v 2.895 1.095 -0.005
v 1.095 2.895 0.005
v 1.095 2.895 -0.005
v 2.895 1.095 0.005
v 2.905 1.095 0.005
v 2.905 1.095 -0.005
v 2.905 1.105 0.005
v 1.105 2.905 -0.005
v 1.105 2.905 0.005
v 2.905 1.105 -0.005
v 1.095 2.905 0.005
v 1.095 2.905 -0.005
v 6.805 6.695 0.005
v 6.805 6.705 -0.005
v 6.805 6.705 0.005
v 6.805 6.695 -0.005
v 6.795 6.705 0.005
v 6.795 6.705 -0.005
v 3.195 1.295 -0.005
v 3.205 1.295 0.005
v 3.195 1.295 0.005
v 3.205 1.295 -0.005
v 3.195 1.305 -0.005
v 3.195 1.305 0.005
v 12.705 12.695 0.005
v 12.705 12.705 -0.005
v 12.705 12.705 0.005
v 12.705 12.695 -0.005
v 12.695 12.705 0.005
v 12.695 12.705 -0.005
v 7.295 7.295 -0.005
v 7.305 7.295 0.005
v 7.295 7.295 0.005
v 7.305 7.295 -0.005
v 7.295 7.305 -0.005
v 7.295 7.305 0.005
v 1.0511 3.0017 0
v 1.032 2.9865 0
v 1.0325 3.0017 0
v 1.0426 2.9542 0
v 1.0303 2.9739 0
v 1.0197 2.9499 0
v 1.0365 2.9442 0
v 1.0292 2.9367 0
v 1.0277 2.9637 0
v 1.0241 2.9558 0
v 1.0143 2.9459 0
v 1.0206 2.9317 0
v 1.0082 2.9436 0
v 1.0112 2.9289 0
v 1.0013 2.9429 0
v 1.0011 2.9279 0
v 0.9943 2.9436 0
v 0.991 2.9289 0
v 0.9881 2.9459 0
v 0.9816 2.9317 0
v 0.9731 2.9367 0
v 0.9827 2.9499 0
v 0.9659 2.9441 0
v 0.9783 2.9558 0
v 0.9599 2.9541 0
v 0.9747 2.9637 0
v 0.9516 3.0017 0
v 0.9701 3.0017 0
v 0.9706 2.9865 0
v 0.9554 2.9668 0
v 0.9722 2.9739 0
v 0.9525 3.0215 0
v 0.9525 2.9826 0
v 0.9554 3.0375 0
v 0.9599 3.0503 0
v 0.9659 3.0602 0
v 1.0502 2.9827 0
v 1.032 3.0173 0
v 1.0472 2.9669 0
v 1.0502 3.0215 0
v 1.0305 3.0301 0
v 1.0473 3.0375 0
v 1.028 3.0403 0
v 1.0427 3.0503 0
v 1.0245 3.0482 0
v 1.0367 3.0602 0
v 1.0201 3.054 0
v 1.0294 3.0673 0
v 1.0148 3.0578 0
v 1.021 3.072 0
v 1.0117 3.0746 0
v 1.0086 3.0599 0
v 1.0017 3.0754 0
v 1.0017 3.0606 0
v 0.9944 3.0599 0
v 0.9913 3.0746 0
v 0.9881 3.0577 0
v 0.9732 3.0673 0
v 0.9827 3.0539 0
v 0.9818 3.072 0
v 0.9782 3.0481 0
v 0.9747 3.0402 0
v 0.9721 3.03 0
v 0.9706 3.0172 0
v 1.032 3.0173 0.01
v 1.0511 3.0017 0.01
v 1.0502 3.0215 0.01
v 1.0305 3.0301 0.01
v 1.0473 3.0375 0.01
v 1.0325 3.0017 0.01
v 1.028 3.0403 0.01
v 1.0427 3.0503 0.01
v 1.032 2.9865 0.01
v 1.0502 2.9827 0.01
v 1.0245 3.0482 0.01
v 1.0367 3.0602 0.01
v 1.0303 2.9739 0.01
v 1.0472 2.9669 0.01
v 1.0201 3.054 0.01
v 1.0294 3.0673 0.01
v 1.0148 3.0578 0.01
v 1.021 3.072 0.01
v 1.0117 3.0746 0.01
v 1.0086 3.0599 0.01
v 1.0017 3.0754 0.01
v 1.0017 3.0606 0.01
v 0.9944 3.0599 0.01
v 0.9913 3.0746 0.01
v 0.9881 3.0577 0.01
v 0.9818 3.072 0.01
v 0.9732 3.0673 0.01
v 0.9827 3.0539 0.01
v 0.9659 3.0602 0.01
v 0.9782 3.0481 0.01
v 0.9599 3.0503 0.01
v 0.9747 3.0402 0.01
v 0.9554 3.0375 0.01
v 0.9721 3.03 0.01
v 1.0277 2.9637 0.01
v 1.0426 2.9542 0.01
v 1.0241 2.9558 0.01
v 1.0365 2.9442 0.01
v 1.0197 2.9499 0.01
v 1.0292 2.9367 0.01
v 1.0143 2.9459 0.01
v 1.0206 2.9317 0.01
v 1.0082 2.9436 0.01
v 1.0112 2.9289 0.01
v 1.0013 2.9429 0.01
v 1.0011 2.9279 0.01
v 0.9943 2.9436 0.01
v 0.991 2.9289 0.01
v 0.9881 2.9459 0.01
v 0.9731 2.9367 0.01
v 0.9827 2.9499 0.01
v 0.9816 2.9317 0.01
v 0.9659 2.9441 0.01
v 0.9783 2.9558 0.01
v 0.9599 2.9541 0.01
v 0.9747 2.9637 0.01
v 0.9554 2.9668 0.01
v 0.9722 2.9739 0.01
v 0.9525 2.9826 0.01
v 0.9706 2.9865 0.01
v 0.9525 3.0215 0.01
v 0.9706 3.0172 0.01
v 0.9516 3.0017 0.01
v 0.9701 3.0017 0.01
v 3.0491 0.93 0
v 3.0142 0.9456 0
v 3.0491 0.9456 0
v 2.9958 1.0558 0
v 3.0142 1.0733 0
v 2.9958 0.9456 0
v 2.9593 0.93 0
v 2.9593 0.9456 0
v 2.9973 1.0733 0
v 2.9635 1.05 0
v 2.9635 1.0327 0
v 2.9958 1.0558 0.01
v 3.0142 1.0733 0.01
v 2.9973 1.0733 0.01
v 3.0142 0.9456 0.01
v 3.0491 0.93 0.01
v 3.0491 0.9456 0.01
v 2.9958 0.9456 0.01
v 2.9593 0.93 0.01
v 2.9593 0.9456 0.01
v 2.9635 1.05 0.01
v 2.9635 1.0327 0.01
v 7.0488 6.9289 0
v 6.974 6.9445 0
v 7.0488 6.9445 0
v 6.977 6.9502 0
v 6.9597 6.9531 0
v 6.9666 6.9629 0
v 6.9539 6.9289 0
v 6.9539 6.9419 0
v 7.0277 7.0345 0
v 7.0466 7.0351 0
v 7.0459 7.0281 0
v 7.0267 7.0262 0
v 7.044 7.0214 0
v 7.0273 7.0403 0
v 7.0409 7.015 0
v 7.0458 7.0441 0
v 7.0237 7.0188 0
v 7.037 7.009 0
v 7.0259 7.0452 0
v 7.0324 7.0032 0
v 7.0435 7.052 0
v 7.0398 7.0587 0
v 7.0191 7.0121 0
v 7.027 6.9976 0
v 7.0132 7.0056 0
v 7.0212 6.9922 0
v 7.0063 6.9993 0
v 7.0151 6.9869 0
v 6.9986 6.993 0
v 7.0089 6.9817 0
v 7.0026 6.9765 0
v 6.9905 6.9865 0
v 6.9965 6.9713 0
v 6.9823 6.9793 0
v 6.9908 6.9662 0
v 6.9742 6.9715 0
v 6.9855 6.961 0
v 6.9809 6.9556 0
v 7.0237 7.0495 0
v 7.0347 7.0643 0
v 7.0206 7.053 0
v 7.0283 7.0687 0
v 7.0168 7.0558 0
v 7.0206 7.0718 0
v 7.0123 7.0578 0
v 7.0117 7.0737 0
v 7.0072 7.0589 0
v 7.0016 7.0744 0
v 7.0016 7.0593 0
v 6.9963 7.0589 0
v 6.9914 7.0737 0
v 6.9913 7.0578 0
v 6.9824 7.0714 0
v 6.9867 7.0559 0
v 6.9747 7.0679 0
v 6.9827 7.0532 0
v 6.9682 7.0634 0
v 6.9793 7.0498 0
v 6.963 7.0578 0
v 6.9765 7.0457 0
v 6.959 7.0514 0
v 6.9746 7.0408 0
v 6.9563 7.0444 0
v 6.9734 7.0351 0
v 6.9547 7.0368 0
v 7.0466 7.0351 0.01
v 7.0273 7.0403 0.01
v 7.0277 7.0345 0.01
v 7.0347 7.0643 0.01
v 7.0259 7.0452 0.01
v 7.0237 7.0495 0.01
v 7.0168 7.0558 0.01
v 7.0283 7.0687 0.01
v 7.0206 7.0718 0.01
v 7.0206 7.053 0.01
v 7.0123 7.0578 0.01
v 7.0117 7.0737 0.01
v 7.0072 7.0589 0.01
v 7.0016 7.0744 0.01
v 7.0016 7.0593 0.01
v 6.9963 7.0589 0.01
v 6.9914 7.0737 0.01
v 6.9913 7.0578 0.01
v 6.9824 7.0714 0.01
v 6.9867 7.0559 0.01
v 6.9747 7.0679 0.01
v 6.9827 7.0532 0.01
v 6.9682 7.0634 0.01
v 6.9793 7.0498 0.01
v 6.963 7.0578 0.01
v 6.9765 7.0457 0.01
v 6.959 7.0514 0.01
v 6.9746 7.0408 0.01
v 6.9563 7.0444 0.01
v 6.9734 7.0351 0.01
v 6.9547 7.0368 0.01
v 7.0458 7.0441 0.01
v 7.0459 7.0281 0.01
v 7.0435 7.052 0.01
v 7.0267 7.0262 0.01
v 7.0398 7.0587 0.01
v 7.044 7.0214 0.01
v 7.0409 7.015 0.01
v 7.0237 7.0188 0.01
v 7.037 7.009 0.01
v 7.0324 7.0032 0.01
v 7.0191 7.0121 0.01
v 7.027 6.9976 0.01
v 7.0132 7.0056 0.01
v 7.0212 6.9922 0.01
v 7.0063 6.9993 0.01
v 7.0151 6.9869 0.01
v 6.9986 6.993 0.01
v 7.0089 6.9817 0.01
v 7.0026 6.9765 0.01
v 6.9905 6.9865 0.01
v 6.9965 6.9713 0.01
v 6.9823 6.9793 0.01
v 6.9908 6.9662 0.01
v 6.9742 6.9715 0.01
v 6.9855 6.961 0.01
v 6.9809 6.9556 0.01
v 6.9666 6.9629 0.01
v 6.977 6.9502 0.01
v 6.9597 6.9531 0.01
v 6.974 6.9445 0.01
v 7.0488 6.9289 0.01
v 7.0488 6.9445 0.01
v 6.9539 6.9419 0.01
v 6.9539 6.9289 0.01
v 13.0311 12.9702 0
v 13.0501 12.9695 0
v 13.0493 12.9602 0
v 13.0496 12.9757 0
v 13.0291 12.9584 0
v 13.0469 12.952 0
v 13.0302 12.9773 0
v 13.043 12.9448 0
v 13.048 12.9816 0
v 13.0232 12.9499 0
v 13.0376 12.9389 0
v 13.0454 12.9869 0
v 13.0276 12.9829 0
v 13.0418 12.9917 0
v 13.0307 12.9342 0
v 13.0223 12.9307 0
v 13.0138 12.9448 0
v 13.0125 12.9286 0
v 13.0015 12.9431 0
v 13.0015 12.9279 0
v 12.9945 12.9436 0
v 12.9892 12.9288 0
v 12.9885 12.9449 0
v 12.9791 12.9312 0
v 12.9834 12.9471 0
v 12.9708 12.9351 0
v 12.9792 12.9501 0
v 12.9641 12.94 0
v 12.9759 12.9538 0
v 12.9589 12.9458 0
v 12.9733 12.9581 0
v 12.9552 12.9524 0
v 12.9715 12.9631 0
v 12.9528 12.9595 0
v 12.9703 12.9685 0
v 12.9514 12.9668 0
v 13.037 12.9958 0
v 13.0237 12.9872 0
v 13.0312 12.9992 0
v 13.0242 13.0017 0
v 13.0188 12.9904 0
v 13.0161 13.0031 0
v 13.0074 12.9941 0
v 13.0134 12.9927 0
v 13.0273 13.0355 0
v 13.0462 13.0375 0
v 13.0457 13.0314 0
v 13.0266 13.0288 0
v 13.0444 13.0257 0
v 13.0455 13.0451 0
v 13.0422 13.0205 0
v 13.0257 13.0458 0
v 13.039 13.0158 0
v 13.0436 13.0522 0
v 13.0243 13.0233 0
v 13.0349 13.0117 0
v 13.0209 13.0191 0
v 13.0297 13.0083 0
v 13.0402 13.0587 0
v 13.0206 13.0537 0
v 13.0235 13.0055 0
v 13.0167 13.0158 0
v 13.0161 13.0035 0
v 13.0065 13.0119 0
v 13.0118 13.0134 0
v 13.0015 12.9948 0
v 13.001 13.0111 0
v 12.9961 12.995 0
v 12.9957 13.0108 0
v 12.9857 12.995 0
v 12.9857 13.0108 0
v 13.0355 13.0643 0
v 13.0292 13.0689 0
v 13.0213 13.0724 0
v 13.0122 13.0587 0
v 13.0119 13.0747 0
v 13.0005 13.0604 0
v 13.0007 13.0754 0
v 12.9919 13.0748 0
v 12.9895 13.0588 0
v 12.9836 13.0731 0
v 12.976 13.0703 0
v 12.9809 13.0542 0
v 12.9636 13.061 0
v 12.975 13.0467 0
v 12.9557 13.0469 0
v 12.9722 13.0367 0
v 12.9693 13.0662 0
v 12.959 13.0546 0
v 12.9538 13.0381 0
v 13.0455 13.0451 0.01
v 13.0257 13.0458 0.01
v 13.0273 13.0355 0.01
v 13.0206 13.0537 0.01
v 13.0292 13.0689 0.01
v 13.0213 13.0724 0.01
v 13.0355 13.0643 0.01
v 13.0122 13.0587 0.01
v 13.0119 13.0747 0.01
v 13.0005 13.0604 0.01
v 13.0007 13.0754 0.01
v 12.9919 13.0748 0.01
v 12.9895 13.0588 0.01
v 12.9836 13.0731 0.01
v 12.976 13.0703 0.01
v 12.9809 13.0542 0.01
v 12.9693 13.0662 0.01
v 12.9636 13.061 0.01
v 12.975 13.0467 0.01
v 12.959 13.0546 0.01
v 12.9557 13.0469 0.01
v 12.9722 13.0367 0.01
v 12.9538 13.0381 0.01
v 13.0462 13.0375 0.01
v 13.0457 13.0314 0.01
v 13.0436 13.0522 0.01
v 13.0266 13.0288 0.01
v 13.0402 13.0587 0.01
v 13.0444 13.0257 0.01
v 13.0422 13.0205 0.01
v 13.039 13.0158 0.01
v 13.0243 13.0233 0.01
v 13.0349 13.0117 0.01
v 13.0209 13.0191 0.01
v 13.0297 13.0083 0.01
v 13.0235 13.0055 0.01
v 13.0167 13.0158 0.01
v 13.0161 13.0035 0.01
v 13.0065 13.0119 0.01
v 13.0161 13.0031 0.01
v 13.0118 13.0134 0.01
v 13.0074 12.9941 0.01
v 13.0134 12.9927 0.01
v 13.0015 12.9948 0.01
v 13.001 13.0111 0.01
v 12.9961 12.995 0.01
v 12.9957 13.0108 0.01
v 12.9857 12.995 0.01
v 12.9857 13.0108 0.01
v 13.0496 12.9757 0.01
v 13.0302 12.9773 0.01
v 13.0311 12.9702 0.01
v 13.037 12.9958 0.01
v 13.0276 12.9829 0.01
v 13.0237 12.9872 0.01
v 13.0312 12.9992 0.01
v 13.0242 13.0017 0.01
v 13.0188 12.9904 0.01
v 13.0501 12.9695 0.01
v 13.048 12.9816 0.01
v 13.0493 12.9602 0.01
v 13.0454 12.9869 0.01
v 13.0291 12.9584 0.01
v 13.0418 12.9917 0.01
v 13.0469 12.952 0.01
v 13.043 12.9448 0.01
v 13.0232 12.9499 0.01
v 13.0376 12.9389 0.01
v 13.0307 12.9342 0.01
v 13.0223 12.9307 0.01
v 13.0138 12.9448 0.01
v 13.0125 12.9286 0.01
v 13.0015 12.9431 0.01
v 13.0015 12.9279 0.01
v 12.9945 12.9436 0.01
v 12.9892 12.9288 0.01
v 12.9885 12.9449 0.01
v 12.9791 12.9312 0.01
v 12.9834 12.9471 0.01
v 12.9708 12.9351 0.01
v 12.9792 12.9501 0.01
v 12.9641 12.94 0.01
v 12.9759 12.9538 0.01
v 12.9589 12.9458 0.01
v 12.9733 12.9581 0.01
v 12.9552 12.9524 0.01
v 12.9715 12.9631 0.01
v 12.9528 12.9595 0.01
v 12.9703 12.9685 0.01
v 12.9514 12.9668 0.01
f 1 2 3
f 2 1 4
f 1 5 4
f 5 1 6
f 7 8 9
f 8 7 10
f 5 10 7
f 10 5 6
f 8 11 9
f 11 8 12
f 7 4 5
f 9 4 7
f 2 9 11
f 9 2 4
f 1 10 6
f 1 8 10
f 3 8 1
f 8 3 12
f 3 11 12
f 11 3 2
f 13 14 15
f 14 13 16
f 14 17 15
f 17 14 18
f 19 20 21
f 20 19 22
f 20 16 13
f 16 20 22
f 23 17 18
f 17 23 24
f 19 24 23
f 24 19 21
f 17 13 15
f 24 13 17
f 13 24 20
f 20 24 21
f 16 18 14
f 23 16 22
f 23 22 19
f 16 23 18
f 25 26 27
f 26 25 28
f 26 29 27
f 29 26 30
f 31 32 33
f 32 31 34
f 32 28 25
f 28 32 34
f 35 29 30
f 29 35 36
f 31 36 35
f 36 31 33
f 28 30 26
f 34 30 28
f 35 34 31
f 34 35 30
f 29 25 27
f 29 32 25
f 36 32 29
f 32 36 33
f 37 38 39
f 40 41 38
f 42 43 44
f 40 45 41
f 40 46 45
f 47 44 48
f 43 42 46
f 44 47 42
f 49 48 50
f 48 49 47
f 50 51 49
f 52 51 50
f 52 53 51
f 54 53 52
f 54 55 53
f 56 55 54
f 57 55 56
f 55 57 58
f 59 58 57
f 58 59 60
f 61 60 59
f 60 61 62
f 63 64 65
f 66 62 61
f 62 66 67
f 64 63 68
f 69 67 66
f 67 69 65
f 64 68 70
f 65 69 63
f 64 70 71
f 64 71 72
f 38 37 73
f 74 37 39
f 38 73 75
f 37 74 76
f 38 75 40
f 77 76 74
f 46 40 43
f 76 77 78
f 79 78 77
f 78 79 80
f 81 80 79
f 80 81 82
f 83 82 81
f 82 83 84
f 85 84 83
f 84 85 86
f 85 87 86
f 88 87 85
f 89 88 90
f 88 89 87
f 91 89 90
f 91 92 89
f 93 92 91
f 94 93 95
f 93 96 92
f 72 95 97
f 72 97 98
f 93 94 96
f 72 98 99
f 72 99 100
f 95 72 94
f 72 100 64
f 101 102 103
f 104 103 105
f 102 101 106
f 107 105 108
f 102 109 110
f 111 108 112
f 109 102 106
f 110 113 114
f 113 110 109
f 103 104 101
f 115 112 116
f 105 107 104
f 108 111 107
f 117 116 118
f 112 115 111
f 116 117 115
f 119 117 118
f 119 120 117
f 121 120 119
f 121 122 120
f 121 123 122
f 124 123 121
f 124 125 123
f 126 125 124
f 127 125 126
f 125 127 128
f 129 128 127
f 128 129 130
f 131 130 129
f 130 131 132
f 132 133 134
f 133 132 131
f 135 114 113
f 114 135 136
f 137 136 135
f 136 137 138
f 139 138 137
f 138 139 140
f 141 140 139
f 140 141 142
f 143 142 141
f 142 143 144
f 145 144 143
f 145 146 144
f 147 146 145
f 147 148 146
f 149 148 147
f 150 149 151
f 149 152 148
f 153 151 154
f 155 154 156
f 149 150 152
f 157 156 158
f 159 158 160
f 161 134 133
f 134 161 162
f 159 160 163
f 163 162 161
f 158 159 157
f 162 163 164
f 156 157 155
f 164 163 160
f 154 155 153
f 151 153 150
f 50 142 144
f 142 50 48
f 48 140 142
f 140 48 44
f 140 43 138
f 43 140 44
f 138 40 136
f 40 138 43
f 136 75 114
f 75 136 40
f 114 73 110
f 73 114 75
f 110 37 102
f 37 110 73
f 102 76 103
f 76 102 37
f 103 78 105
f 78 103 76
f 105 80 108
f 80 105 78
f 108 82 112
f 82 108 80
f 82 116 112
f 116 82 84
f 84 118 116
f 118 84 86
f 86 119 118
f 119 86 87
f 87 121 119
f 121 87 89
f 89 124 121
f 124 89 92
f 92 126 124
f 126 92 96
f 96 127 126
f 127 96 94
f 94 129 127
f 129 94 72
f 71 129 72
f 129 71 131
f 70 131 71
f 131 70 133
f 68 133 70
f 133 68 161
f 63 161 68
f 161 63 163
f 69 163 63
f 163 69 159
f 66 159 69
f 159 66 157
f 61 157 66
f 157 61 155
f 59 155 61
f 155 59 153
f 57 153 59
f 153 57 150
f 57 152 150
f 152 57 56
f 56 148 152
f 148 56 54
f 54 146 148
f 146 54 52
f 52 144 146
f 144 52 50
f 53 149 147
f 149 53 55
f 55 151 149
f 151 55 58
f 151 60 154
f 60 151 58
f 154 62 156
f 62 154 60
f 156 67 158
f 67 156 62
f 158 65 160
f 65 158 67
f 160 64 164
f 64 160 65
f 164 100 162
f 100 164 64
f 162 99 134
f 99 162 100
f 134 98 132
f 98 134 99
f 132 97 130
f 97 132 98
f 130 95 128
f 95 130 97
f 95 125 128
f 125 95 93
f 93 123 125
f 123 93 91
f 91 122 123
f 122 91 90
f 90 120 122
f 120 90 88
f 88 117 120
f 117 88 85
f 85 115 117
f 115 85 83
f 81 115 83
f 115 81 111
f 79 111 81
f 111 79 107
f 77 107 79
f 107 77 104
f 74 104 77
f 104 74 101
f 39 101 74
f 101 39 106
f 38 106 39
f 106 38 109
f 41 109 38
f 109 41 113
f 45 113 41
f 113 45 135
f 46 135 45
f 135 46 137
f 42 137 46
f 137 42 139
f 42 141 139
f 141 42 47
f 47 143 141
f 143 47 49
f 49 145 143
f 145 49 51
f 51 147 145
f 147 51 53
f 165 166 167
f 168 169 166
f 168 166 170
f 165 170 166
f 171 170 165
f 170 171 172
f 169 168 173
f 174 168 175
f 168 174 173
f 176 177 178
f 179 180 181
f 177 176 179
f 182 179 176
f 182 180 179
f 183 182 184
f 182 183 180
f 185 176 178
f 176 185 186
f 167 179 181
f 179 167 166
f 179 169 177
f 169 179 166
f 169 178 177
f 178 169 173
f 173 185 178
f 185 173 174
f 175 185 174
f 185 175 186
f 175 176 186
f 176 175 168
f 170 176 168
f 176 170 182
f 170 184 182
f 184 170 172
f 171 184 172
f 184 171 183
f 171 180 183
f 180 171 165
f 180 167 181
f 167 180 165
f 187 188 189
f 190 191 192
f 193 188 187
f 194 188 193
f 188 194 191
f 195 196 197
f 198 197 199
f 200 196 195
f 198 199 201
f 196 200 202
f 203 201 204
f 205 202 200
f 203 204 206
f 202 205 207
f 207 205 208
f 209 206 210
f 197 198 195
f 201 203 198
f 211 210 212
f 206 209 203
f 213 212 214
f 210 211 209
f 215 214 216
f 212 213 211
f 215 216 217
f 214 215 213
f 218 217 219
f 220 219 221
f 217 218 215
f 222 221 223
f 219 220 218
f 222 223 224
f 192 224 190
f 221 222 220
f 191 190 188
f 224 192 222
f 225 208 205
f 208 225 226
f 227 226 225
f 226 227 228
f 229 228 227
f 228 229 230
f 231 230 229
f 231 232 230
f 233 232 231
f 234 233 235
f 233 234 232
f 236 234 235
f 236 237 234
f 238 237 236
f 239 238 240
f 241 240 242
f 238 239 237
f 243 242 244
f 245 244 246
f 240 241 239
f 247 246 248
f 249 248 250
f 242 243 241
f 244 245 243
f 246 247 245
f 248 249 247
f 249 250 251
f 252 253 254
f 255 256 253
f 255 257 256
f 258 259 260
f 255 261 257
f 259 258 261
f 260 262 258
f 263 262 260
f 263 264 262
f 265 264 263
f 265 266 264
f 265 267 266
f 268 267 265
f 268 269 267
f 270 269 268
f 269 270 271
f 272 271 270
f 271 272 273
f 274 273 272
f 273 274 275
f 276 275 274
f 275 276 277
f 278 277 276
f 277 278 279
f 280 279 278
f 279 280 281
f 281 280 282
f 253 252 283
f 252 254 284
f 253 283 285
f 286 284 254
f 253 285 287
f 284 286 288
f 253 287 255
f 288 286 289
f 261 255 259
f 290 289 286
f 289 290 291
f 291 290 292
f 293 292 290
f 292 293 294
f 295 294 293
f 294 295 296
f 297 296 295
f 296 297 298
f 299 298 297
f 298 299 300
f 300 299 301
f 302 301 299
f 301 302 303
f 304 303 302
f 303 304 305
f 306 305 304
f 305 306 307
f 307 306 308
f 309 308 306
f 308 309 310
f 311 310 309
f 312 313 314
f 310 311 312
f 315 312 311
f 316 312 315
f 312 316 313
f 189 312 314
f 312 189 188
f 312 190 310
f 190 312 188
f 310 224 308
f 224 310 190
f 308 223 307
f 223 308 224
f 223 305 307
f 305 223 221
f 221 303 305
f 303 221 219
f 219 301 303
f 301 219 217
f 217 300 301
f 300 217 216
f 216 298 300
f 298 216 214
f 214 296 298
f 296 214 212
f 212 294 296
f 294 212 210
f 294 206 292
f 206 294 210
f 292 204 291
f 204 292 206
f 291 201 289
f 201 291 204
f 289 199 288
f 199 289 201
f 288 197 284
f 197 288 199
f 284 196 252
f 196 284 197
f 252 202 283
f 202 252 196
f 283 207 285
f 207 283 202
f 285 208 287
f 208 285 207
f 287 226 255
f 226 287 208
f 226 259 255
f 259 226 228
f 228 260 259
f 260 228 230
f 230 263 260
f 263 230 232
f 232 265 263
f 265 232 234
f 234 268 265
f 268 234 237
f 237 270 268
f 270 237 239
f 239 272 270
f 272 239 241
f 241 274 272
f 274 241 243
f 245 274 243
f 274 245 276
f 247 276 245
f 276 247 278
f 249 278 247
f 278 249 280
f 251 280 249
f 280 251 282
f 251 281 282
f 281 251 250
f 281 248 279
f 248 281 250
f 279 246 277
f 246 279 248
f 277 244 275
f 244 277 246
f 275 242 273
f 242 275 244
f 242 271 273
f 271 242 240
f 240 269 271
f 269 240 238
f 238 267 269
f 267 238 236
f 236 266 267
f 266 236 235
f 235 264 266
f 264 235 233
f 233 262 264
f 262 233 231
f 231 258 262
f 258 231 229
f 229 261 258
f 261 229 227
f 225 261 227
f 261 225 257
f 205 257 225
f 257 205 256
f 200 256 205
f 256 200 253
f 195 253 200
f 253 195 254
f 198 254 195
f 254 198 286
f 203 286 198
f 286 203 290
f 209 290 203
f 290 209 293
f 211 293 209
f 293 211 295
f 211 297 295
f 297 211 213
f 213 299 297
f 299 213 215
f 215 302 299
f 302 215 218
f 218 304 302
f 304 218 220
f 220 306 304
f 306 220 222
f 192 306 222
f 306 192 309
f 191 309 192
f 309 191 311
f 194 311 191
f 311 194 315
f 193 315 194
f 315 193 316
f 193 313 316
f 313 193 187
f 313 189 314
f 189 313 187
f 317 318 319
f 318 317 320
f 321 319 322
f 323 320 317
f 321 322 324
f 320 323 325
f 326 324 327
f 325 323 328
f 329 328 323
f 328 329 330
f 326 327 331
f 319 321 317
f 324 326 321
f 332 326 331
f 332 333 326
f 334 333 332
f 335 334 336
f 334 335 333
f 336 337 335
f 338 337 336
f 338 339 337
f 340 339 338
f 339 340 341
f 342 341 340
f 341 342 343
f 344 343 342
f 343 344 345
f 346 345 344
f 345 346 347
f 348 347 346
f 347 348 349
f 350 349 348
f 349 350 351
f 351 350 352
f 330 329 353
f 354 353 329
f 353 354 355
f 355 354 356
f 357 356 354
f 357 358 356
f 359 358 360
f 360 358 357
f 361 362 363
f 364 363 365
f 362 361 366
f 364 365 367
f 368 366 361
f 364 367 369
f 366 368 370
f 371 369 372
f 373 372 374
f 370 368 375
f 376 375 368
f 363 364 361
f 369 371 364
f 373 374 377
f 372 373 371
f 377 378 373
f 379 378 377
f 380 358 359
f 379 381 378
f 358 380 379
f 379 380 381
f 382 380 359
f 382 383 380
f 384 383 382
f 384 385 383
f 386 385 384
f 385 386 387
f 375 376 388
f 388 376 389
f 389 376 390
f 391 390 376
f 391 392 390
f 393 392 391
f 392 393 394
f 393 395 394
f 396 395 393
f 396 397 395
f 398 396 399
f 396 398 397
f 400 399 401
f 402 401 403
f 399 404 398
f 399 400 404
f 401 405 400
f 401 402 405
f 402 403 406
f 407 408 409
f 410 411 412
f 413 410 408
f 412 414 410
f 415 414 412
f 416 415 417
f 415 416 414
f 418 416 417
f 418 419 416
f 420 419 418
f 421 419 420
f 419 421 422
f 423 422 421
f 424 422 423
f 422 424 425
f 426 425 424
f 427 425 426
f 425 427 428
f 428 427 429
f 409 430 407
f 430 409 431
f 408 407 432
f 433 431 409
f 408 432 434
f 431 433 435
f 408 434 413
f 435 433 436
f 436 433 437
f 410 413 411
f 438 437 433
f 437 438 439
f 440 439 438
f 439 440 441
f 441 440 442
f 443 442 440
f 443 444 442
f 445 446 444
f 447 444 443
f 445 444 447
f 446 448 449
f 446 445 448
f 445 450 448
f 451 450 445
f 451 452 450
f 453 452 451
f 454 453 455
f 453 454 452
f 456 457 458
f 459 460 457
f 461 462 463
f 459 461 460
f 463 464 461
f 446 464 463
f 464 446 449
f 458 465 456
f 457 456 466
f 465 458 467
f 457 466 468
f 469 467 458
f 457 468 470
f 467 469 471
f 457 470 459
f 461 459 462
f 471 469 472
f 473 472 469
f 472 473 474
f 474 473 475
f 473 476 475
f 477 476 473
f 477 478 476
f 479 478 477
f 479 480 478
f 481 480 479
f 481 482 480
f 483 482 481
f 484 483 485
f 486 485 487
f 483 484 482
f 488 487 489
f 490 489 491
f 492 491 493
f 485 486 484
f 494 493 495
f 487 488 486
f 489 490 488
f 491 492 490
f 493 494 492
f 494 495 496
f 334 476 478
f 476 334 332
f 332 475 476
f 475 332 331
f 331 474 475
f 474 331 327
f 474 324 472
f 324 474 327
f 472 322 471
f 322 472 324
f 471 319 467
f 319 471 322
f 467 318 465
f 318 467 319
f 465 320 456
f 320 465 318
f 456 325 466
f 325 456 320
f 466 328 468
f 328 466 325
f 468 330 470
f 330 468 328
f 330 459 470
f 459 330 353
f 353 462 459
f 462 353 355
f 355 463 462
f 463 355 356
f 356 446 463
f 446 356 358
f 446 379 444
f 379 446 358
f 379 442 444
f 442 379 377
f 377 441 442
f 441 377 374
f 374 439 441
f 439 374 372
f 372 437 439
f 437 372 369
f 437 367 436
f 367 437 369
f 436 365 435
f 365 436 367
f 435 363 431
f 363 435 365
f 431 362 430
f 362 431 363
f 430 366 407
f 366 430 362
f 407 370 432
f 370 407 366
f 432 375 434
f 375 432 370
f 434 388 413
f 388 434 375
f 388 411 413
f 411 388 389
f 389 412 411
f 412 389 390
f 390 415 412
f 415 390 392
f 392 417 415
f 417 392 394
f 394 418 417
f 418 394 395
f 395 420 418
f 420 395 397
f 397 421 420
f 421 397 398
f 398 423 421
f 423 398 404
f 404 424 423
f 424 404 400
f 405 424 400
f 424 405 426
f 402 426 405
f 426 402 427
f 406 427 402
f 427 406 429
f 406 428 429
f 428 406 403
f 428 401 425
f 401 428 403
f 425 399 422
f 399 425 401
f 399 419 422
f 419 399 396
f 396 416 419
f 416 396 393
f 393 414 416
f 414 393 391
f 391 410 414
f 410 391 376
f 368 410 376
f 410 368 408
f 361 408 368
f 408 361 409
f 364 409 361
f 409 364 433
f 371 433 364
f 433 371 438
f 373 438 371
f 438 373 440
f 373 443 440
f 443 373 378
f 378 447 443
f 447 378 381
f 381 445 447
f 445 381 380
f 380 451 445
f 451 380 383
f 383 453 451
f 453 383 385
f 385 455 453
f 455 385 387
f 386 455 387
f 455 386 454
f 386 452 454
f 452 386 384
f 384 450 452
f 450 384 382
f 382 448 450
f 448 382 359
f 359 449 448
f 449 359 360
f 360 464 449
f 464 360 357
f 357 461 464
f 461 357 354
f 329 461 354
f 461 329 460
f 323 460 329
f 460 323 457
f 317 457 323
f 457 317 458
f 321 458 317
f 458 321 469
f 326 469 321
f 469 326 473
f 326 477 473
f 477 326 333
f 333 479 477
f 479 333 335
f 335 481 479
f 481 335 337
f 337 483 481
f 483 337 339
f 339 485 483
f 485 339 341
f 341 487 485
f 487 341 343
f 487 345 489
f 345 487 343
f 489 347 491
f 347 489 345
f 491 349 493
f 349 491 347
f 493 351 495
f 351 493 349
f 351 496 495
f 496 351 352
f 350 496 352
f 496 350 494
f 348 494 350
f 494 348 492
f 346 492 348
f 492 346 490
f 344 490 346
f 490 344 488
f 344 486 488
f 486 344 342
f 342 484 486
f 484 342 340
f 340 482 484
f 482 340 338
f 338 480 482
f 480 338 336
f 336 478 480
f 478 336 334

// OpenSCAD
hull() {
    translate([1.1, 2.9000000000000004, 0]) cube([0.01, 0.01, 0.01], center=true);
    translate([2.9000000000000004, 1.1, 0]) cube([0.01, 0.01, 0.01], center=true);
}


hull() {
    translate([3.2, 1.3, 0]) cube([0.01, 0.01, 0.01], center=true);
    translate([6.8, 6.7, 0]) cube([0.01, 0.01, 0.01], center=true);
}


hull() {
    translate([7.3, 7.3, 0]) cube([0.01, 0.01, 0.01], center=true);
    translate([12.700000000000001, 12.700000000000001, 0]) cube([0.01, 0.01, 0.01], center=true);
}


translate([1, 3, 0]) linear_extrude(0.01) text("0",size=0.15, halign="center", valign="center");

translate([3, 1, 0]) linear_extrude(0.01) text("1",size=0.15, halign="center", valign="center");

translate([7, 7, 0]) linear_extrude(0.01) text("2",size=0.15, halign="center", valign="center");

translate([13, 13, 0]) linear_extrude(0.01) text("3",size=0.15, halign="center", valign="center");
